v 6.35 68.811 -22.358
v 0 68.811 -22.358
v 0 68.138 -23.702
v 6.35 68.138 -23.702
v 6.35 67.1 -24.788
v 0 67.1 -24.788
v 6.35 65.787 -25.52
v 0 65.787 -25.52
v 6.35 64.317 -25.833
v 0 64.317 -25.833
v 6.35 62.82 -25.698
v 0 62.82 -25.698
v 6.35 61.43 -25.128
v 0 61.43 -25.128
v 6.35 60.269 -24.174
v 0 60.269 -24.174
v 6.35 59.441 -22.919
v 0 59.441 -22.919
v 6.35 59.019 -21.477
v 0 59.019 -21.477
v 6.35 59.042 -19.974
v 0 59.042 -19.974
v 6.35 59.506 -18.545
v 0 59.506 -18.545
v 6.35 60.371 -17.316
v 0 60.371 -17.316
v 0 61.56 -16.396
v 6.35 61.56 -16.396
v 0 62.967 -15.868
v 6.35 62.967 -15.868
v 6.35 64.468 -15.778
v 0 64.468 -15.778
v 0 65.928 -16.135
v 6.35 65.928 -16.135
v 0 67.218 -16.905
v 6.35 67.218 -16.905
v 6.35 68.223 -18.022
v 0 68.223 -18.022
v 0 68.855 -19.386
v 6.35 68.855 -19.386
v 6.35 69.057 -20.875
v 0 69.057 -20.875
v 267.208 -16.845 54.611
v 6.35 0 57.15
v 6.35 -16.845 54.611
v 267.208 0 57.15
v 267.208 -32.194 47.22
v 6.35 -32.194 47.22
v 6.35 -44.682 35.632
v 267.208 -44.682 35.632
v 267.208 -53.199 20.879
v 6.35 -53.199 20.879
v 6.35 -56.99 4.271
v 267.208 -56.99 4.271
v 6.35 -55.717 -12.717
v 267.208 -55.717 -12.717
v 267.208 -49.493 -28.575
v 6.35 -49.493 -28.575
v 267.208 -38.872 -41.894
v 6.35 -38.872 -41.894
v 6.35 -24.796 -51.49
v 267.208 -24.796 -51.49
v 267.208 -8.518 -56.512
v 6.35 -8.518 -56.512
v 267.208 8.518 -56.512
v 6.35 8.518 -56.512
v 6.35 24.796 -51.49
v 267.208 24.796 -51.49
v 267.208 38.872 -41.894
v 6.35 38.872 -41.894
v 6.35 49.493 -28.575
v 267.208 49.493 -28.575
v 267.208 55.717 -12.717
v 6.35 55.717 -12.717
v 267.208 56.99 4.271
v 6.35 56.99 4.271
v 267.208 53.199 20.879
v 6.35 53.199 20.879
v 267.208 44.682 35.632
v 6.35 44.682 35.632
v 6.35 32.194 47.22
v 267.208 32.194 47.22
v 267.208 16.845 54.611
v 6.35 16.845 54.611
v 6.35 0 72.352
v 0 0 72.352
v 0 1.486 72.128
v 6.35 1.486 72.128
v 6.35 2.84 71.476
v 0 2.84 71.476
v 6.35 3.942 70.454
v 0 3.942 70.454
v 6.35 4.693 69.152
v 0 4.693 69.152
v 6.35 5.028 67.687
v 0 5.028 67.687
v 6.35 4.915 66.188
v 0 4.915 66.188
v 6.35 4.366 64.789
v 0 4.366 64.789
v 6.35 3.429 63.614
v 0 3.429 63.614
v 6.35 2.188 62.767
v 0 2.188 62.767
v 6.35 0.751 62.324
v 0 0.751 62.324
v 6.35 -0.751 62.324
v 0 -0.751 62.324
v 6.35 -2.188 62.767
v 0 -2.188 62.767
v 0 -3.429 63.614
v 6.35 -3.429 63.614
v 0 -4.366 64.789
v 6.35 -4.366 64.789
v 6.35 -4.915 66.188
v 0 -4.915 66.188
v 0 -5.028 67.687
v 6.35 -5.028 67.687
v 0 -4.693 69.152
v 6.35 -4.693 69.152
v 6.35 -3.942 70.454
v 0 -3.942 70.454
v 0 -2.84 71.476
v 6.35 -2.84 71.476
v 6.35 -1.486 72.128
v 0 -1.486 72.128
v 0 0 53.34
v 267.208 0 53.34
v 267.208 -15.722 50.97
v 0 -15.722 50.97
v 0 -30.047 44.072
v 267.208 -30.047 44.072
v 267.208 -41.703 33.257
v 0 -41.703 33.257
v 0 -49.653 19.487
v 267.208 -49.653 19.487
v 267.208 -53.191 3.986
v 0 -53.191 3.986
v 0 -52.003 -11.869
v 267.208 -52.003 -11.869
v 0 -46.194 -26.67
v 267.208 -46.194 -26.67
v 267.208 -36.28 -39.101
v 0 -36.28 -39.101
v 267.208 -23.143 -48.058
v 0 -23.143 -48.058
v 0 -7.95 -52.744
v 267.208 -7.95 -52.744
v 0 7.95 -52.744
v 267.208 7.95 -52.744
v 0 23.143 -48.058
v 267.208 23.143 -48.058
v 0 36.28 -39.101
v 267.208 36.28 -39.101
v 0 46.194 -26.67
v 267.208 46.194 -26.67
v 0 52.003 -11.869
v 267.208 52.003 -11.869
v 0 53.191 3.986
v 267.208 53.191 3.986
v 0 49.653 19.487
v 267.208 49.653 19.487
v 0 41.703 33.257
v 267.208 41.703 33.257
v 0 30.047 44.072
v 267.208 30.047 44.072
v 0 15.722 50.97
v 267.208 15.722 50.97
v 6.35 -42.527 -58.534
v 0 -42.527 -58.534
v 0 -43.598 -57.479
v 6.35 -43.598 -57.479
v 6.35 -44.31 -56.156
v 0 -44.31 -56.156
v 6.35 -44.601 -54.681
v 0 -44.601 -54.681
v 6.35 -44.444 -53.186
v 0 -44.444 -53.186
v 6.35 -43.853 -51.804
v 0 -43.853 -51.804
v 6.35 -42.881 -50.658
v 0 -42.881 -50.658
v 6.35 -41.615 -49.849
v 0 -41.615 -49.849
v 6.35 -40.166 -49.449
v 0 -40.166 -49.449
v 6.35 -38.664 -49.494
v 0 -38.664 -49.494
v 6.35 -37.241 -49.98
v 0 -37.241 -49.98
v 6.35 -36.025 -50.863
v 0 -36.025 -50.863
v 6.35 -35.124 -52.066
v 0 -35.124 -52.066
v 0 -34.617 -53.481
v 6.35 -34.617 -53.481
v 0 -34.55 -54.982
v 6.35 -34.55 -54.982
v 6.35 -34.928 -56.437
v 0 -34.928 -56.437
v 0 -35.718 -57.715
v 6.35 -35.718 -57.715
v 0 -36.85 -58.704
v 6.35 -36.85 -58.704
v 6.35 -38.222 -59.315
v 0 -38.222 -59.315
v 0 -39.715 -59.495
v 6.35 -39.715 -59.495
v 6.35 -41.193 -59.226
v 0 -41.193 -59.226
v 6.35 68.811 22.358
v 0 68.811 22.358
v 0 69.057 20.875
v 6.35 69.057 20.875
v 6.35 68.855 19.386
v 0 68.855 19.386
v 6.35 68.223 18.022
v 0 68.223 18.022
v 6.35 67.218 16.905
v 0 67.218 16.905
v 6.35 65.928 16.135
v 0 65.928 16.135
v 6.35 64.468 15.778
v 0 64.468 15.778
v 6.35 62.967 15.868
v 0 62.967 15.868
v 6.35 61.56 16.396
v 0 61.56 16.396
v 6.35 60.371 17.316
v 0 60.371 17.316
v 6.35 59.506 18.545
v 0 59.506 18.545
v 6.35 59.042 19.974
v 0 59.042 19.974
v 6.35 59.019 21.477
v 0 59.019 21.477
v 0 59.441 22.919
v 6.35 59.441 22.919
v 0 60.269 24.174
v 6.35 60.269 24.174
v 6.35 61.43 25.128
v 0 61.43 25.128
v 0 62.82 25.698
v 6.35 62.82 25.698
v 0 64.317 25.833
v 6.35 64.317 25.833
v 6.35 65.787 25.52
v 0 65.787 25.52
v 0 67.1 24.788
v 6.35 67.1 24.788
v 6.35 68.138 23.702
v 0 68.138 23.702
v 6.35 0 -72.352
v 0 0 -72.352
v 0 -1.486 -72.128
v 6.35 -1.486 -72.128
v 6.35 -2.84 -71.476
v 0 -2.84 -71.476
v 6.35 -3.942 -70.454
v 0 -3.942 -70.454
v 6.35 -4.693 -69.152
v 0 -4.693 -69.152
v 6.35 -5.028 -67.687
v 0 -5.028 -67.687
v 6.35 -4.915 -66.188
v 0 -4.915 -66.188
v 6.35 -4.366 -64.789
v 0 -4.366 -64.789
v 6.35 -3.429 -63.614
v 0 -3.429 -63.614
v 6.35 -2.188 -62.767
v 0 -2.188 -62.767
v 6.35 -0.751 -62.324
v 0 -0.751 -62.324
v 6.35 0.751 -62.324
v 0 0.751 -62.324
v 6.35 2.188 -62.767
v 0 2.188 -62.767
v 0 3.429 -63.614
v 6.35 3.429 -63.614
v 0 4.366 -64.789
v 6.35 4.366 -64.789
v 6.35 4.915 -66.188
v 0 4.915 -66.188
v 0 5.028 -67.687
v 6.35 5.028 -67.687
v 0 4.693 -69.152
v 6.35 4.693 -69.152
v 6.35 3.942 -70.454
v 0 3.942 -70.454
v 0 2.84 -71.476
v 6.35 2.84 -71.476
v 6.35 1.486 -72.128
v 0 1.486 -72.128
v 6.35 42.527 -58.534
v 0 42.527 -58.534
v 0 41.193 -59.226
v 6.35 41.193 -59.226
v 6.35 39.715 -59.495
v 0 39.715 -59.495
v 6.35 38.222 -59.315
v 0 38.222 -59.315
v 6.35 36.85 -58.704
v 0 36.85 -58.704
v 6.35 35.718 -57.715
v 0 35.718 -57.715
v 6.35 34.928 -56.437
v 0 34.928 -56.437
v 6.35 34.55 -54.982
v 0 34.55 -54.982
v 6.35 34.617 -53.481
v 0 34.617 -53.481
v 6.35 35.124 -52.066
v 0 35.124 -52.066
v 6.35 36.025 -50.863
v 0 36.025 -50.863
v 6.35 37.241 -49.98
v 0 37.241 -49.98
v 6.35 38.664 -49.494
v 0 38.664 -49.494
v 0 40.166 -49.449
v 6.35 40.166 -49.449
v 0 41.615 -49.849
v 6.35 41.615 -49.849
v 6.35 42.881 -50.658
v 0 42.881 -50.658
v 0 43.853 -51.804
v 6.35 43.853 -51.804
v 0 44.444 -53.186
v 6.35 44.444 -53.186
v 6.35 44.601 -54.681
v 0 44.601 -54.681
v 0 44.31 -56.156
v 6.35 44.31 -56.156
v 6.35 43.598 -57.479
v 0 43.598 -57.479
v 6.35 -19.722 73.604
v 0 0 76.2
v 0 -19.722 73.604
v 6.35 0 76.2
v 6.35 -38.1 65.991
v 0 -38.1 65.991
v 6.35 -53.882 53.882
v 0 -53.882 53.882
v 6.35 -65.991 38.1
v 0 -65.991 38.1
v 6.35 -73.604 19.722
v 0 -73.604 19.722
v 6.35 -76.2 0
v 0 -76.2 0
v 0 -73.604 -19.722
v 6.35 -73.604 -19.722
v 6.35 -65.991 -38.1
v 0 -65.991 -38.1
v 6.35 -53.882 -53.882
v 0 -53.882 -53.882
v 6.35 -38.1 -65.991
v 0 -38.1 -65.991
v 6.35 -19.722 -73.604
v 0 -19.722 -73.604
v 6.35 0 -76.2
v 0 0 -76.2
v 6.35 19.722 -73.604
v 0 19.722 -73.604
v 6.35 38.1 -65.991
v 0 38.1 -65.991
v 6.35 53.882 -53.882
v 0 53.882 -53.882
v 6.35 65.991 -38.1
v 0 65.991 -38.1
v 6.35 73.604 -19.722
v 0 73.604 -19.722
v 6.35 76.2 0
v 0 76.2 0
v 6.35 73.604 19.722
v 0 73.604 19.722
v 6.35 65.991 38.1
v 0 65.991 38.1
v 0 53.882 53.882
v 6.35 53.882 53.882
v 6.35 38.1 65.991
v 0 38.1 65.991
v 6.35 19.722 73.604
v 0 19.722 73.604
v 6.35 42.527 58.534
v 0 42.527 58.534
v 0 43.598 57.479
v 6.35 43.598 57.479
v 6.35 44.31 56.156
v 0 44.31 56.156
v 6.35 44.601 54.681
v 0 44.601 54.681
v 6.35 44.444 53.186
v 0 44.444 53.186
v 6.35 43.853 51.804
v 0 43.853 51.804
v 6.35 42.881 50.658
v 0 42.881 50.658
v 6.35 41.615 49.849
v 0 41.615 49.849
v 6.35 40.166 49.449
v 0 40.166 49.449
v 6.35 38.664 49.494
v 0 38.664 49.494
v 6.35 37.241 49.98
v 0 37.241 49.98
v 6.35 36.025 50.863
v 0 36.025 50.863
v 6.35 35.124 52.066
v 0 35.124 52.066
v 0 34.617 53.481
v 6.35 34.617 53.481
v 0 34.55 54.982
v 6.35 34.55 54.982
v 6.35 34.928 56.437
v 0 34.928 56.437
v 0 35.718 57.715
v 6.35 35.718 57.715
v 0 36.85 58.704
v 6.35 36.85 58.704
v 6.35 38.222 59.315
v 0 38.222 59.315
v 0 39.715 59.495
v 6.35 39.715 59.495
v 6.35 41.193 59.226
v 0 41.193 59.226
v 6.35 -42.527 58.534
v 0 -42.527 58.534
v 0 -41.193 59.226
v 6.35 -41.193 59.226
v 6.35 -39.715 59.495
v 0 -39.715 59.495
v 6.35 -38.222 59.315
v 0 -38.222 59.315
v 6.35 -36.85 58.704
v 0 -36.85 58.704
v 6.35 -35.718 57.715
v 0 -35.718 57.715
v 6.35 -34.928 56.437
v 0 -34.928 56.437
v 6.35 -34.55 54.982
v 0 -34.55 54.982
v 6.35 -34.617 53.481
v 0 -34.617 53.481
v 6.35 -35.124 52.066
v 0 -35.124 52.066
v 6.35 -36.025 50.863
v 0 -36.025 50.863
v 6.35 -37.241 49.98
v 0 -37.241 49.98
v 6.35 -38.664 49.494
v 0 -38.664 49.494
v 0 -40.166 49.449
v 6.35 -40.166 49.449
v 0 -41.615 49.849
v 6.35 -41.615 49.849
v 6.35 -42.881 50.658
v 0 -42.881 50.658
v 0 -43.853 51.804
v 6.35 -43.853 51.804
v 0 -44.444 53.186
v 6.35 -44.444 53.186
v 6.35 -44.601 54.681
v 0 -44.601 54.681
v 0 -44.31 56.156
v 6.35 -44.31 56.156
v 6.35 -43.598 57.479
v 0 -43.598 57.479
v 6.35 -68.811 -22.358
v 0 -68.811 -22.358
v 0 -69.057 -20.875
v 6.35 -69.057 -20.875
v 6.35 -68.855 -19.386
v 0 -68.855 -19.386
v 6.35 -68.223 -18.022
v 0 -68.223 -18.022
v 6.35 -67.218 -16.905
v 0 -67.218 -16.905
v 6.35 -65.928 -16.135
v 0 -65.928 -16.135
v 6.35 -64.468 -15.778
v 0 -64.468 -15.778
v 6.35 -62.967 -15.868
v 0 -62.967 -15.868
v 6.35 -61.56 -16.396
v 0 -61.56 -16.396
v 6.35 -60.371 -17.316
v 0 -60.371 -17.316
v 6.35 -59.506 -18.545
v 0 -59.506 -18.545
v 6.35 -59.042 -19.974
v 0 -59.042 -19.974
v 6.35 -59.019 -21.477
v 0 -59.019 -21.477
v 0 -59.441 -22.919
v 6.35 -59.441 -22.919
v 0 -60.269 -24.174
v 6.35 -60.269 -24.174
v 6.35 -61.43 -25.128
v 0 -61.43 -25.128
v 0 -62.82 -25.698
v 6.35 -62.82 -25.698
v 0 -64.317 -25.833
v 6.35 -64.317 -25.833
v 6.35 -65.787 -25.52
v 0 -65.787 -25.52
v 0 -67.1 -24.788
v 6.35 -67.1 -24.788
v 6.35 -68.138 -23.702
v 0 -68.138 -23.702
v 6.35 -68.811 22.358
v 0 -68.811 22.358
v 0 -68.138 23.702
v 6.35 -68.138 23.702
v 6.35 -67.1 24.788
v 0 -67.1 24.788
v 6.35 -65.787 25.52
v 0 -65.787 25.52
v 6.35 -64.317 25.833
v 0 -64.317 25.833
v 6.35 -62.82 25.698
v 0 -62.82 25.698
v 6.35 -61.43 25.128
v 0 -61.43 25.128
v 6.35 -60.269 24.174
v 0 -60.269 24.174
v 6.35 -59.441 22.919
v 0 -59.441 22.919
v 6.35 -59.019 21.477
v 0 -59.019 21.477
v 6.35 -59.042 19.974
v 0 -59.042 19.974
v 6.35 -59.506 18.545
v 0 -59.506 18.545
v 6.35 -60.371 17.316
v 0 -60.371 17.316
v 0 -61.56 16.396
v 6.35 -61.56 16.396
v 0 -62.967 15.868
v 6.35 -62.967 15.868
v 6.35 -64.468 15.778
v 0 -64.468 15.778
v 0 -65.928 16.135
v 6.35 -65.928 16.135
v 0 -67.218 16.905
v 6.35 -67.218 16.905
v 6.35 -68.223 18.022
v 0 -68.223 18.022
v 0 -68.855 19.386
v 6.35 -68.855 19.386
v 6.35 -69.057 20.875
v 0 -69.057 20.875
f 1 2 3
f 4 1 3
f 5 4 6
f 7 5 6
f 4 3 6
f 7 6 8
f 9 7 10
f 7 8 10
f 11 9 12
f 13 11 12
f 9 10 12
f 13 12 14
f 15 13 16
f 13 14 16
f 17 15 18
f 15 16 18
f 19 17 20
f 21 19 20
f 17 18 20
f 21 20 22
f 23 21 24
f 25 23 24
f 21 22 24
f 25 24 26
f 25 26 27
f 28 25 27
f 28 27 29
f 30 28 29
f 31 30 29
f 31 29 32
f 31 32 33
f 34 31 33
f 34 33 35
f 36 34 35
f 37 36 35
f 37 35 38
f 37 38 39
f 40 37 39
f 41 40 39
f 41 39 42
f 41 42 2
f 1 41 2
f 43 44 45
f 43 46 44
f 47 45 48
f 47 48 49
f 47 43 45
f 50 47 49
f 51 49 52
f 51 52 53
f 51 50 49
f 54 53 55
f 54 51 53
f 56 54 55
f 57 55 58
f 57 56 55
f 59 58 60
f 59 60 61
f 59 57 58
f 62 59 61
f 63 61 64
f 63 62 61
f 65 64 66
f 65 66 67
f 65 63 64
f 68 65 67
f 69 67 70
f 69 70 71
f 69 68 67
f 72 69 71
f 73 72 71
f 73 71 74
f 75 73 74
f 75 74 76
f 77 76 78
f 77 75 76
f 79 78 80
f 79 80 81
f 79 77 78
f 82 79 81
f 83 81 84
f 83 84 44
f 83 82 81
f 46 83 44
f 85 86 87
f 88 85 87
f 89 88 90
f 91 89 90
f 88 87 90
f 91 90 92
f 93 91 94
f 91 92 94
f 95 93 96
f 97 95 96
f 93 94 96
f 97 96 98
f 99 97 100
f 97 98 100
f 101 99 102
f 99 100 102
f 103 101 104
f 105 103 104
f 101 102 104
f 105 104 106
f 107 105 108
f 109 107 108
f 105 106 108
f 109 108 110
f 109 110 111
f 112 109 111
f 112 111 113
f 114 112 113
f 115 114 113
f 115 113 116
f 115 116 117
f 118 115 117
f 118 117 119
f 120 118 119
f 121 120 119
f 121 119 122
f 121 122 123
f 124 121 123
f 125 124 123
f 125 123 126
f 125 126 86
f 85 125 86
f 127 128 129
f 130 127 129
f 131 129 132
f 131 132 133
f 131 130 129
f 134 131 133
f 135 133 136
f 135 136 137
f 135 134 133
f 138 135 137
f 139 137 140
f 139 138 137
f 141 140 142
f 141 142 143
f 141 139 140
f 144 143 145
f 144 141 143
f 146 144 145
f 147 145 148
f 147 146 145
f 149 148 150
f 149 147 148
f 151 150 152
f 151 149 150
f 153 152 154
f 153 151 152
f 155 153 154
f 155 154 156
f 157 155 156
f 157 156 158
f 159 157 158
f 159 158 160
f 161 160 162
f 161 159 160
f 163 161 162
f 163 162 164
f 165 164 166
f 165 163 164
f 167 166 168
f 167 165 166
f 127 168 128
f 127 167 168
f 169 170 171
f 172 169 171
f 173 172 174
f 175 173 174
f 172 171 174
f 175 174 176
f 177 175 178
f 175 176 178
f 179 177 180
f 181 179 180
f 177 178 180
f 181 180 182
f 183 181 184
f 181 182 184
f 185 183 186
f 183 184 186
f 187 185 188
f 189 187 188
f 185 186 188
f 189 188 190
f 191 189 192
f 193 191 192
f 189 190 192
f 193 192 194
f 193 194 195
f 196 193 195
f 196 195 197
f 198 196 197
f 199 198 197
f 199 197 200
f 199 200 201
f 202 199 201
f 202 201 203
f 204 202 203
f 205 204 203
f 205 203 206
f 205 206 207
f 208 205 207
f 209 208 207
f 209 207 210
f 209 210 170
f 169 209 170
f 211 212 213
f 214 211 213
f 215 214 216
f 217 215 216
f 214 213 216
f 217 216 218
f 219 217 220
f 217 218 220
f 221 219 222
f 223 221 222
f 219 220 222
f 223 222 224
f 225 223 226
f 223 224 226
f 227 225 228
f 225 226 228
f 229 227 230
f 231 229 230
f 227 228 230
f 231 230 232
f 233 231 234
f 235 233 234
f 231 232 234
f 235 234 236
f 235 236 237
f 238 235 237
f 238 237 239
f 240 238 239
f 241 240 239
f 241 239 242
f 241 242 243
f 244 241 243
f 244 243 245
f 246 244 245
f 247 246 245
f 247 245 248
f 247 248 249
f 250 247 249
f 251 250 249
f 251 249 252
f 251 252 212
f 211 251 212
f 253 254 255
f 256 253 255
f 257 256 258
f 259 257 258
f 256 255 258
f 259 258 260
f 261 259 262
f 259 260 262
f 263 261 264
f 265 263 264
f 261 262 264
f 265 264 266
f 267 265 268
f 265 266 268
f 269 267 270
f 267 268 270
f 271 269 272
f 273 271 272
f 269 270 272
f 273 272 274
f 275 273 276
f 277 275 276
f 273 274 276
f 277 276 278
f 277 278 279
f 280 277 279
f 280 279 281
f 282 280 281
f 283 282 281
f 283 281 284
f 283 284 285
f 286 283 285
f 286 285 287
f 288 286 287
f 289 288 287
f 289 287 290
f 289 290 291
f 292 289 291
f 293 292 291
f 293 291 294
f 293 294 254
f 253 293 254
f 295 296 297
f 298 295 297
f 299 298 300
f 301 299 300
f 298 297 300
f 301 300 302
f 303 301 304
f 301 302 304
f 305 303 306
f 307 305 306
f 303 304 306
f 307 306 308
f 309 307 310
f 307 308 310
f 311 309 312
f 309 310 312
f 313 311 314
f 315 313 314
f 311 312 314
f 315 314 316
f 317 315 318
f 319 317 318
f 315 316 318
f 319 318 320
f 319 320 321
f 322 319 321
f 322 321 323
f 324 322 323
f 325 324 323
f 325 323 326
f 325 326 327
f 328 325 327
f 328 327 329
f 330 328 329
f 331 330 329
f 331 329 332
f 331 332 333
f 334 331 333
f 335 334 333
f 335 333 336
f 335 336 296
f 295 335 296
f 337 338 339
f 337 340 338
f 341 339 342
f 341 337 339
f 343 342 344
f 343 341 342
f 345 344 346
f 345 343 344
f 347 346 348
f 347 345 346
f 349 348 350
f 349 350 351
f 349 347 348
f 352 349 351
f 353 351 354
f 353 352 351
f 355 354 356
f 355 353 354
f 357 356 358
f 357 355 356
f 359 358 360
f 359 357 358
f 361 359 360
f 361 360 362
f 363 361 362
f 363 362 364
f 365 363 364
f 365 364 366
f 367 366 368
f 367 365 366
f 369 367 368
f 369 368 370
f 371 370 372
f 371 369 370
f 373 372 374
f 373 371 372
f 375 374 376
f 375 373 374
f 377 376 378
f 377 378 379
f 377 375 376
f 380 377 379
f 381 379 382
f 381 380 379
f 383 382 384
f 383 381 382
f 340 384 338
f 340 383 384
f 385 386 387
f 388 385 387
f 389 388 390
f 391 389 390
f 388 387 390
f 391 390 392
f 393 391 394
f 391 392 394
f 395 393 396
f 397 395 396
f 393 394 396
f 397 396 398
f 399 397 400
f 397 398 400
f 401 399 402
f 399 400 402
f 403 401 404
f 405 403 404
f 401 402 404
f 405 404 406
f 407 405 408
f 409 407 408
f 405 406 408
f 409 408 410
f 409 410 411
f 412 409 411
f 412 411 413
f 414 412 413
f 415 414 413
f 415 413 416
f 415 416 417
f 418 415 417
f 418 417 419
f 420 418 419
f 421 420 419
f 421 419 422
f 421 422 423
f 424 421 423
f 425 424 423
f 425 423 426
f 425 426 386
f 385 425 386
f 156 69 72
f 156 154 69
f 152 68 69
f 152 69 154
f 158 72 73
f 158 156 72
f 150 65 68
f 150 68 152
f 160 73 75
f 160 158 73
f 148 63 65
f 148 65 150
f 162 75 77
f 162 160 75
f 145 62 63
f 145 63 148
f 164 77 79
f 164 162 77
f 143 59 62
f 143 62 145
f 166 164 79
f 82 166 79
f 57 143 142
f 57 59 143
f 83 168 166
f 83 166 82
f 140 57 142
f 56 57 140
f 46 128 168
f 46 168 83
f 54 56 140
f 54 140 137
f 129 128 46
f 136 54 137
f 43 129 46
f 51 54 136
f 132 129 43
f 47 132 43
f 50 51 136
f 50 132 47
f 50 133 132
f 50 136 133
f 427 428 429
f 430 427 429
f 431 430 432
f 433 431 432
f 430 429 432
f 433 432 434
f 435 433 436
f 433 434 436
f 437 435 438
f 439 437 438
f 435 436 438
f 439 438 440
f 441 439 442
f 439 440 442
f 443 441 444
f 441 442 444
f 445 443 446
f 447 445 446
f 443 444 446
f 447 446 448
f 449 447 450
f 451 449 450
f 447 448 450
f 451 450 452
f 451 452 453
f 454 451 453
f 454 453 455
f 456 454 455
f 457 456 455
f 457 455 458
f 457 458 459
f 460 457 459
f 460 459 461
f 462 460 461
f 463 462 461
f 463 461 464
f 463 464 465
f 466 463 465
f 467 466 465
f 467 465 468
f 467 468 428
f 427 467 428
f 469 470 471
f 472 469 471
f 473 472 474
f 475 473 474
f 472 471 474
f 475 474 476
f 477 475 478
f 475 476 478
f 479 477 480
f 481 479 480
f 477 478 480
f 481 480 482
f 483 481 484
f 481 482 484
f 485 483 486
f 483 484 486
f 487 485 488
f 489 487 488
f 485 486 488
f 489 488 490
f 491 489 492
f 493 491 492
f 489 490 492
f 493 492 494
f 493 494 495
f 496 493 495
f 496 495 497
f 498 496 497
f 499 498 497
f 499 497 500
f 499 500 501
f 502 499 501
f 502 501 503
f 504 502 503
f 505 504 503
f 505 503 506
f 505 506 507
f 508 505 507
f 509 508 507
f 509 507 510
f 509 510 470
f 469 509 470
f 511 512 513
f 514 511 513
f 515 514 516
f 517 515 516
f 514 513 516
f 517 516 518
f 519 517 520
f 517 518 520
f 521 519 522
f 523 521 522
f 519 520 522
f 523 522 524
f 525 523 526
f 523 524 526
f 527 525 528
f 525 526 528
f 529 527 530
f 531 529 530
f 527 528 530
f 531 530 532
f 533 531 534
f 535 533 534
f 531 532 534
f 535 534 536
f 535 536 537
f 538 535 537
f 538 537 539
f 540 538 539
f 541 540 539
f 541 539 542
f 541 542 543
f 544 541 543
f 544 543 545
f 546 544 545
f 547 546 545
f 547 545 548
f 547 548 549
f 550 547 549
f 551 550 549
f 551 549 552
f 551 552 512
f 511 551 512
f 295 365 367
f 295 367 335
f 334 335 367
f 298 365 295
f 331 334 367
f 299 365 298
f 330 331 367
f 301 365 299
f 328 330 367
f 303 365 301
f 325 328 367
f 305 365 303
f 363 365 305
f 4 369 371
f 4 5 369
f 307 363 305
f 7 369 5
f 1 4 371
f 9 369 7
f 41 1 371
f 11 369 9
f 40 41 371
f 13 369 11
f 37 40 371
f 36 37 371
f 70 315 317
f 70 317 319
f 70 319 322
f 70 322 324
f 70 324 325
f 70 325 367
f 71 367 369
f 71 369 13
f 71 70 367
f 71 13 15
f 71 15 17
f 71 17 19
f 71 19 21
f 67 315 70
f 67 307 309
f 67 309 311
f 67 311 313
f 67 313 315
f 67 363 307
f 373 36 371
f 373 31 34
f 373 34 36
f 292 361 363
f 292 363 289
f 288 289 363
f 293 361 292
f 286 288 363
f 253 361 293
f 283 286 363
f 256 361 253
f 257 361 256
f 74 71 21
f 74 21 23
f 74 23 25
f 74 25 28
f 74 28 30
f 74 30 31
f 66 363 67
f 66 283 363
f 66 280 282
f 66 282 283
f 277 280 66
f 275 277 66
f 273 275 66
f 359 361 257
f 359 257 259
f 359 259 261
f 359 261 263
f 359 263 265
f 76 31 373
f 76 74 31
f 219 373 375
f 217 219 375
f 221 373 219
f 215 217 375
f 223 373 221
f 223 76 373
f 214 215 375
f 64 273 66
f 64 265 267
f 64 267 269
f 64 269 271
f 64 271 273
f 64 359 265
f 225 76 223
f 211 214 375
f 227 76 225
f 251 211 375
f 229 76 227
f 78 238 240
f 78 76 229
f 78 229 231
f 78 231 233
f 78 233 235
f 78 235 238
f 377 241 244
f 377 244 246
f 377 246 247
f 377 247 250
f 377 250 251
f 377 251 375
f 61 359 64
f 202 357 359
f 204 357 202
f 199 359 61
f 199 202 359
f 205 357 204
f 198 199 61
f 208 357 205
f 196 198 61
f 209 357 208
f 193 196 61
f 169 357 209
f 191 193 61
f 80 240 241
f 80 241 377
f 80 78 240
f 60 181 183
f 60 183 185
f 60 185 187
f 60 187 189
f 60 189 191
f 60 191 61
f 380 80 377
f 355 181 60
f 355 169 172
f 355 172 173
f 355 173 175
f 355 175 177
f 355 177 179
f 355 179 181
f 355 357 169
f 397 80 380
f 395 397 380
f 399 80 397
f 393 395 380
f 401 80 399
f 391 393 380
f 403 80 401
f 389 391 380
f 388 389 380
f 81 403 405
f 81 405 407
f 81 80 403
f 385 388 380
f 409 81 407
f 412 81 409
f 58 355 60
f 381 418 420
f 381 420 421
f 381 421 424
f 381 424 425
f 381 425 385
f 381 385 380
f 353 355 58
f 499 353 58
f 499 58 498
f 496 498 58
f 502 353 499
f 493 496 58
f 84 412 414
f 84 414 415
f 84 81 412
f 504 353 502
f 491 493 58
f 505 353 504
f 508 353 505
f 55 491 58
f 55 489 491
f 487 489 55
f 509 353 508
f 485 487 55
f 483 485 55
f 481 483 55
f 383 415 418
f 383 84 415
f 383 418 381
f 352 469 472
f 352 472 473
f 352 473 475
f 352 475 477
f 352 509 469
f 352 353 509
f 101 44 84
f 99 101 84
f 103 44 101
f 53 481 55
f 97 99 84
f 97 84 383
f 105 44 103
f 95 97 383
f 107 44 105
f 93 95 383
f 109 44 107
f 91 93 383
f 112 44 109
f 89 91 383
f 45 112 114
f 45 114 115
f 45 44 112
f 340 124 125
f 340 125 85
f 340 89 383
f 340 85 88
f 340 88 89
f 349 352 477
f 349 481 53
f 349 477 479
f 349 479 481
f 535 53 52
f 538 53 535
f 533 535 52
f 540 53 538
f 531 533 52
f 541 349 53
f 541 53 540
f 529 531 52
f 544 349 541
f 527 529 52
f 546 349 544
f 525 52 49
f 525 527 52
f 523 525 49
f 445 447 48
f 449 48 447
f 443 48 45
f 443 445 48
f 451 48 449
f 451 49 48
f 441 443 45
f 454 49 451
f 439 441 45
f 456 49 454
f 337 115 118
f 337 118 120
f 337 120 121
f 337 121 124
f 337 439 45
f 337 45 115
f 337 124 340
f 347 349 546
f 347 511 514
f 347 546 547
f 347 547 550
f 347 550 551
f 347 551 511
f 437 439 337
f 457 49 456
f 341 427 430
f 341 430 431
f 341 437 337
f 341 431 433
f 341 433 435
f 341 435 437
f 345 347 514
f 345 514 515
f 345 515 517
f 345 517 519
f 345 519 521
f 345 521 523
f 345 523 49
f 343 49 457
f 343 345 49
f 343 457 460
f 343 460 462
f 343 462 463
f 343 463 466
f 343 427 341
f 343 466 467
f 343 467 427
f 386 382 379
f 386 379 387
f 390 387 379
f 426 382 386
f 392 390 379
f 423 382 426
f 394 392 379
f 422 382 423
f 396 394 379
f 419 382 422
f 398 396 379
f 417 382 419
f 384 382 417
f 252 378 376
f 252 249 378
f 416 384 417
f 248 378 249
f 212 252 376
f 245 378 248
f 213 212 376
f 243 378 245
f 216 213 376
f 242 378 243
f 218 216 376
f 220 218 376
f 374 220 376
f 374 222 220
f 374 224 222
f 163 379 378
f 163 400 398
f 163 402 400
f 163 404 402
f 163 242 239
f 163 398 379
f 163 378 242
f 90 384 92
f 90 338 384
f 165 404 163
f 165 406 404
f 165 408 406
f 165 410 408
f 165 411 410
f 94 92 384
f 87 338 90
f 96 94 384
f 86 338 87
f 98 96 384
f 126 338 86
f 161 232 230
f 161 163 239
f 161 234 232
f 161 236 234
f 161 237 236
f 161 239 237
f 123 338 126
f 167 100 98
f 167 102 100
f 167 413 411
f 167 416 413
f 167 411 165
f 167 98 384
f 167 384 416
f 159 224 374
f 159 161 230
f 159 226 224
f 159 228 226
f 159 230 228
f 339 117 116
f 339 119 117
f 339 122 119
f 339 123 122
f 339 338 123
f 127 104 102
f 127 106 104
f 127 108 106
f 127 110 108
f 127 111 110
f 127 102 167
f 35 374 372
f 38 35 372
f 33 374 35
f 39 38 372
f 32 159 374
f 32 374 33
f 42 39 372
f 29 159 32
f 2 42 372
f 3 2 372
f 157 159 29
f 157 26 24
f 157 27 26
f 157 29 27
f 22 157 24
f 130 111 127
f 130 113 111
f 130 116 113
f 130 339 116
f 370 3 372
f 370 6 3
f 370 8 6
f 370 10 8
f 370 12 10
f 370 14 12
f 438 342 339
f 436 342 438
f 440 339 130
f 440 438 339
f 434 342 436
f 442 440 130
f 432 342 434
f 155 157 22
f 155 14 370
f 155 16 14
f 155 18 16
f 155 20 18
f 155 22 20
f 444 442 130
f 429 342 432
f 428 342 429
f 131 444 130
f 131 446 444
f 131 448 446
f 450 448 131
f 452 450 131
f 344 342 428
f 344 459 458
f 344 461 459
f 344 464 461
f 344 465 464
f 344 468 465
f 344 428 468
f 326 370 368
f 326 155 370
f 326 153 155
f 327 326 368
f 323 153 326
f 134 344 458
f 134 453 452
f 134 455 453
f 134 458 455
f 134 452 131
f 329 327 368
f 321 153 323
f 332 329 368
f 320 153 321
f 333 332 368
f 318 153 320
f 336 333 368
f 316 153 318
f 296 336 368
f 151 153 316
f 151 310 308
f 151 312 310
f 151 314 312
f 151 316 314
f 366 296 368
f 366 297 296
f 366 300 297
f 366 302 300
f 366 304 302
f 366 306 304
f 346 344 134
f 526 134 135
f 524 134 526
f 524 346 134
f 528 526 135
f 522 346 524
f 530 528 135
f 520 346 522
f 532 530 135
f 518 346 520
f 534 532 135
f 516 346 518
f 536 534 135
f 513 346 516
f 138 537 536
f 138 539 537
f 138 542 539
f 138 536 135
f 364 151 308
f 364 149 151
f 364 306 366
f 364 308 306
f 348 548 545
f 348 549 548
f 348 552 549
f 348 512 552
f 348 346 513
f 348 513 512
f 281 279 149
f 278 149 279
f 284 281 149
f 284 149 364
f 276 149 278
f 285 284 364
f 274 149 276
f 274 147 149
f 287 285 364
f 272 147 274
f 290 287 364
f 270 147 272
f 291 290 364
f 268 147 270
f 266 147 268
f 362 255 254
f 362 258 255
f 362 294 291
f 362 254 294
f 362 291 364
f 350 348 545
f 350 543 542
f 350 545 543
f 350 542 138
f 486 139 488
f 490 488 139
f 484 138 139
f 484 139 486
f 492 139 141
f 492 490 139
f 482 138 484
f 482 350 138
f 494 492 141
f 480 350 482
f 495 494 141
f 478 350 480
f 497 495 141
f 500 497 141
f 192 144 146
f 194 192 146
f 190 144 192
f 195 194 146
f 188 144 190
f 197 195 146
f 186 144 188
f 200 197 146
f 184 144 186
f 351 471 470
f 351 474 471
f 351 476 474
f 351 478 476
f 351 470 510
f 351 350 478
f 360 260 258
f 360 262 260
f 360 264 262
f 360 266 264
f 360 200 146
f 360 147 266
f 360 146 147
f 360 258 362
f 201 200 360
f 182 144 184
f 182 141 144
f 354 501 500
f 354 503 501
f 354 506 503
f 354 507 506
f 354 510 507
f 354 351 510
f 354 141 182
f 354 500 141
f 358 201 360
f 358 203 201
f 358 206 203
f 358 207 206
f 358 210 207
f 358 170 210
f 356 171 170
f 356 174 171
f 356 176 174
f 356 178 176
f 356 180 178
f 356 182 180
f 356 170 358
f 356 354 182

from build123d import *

# Parameters (mm, degrees)
F_3_8_CLEARANCE_HOLE1_D = 10.0838
CIRPATTERN1_COUNT       = 10


with BuildPart() as part:
    # Sketch1 → Revolve1 (revolve)
    with BuildSketch(Plane.XY, mode=Mode.PRIVATE) as revolve1_sk:
        Polygon((0, 76.2), (6.35, 76.2), (6.35, 57.15), (267.208, 57.15), (267.208, 53.34), (0, 53.34), align=None)
    revolve(revolve1_sk.sketch.rotate(Axis((0, 0, 0), (1, 0, 0)), 90), axis=Axis((0, 0, 0), (1, 0, 0)))

    # 3/8 Clearance Hole1 (through all)
    with Locations(Plane(origin=(6.35, 0, -67.31), x_dir=(0, 0, 1), z_dir=(1, 0, 0))):
        with Locations((0, 0)):
            f_3_8_clearance_hole1 = Hole(F_3_8_CLEARANCE_HOLE1_D / 2)

    # CirPattern1: 3/8 Clearance Hole1 ×10 about axis
    cirpattern1_axis = Axis((0, 0, 0), (1, 0, 0))
    for i in range(1, CIRPATTERN1_COUNT):
        add(f_3_8_clearance_hole1.rotate(cirpattern1_axis, i * 360 / CIRPATTERN1_COUNT), mode=Mode.SUBTRACT)


solid = part.part
